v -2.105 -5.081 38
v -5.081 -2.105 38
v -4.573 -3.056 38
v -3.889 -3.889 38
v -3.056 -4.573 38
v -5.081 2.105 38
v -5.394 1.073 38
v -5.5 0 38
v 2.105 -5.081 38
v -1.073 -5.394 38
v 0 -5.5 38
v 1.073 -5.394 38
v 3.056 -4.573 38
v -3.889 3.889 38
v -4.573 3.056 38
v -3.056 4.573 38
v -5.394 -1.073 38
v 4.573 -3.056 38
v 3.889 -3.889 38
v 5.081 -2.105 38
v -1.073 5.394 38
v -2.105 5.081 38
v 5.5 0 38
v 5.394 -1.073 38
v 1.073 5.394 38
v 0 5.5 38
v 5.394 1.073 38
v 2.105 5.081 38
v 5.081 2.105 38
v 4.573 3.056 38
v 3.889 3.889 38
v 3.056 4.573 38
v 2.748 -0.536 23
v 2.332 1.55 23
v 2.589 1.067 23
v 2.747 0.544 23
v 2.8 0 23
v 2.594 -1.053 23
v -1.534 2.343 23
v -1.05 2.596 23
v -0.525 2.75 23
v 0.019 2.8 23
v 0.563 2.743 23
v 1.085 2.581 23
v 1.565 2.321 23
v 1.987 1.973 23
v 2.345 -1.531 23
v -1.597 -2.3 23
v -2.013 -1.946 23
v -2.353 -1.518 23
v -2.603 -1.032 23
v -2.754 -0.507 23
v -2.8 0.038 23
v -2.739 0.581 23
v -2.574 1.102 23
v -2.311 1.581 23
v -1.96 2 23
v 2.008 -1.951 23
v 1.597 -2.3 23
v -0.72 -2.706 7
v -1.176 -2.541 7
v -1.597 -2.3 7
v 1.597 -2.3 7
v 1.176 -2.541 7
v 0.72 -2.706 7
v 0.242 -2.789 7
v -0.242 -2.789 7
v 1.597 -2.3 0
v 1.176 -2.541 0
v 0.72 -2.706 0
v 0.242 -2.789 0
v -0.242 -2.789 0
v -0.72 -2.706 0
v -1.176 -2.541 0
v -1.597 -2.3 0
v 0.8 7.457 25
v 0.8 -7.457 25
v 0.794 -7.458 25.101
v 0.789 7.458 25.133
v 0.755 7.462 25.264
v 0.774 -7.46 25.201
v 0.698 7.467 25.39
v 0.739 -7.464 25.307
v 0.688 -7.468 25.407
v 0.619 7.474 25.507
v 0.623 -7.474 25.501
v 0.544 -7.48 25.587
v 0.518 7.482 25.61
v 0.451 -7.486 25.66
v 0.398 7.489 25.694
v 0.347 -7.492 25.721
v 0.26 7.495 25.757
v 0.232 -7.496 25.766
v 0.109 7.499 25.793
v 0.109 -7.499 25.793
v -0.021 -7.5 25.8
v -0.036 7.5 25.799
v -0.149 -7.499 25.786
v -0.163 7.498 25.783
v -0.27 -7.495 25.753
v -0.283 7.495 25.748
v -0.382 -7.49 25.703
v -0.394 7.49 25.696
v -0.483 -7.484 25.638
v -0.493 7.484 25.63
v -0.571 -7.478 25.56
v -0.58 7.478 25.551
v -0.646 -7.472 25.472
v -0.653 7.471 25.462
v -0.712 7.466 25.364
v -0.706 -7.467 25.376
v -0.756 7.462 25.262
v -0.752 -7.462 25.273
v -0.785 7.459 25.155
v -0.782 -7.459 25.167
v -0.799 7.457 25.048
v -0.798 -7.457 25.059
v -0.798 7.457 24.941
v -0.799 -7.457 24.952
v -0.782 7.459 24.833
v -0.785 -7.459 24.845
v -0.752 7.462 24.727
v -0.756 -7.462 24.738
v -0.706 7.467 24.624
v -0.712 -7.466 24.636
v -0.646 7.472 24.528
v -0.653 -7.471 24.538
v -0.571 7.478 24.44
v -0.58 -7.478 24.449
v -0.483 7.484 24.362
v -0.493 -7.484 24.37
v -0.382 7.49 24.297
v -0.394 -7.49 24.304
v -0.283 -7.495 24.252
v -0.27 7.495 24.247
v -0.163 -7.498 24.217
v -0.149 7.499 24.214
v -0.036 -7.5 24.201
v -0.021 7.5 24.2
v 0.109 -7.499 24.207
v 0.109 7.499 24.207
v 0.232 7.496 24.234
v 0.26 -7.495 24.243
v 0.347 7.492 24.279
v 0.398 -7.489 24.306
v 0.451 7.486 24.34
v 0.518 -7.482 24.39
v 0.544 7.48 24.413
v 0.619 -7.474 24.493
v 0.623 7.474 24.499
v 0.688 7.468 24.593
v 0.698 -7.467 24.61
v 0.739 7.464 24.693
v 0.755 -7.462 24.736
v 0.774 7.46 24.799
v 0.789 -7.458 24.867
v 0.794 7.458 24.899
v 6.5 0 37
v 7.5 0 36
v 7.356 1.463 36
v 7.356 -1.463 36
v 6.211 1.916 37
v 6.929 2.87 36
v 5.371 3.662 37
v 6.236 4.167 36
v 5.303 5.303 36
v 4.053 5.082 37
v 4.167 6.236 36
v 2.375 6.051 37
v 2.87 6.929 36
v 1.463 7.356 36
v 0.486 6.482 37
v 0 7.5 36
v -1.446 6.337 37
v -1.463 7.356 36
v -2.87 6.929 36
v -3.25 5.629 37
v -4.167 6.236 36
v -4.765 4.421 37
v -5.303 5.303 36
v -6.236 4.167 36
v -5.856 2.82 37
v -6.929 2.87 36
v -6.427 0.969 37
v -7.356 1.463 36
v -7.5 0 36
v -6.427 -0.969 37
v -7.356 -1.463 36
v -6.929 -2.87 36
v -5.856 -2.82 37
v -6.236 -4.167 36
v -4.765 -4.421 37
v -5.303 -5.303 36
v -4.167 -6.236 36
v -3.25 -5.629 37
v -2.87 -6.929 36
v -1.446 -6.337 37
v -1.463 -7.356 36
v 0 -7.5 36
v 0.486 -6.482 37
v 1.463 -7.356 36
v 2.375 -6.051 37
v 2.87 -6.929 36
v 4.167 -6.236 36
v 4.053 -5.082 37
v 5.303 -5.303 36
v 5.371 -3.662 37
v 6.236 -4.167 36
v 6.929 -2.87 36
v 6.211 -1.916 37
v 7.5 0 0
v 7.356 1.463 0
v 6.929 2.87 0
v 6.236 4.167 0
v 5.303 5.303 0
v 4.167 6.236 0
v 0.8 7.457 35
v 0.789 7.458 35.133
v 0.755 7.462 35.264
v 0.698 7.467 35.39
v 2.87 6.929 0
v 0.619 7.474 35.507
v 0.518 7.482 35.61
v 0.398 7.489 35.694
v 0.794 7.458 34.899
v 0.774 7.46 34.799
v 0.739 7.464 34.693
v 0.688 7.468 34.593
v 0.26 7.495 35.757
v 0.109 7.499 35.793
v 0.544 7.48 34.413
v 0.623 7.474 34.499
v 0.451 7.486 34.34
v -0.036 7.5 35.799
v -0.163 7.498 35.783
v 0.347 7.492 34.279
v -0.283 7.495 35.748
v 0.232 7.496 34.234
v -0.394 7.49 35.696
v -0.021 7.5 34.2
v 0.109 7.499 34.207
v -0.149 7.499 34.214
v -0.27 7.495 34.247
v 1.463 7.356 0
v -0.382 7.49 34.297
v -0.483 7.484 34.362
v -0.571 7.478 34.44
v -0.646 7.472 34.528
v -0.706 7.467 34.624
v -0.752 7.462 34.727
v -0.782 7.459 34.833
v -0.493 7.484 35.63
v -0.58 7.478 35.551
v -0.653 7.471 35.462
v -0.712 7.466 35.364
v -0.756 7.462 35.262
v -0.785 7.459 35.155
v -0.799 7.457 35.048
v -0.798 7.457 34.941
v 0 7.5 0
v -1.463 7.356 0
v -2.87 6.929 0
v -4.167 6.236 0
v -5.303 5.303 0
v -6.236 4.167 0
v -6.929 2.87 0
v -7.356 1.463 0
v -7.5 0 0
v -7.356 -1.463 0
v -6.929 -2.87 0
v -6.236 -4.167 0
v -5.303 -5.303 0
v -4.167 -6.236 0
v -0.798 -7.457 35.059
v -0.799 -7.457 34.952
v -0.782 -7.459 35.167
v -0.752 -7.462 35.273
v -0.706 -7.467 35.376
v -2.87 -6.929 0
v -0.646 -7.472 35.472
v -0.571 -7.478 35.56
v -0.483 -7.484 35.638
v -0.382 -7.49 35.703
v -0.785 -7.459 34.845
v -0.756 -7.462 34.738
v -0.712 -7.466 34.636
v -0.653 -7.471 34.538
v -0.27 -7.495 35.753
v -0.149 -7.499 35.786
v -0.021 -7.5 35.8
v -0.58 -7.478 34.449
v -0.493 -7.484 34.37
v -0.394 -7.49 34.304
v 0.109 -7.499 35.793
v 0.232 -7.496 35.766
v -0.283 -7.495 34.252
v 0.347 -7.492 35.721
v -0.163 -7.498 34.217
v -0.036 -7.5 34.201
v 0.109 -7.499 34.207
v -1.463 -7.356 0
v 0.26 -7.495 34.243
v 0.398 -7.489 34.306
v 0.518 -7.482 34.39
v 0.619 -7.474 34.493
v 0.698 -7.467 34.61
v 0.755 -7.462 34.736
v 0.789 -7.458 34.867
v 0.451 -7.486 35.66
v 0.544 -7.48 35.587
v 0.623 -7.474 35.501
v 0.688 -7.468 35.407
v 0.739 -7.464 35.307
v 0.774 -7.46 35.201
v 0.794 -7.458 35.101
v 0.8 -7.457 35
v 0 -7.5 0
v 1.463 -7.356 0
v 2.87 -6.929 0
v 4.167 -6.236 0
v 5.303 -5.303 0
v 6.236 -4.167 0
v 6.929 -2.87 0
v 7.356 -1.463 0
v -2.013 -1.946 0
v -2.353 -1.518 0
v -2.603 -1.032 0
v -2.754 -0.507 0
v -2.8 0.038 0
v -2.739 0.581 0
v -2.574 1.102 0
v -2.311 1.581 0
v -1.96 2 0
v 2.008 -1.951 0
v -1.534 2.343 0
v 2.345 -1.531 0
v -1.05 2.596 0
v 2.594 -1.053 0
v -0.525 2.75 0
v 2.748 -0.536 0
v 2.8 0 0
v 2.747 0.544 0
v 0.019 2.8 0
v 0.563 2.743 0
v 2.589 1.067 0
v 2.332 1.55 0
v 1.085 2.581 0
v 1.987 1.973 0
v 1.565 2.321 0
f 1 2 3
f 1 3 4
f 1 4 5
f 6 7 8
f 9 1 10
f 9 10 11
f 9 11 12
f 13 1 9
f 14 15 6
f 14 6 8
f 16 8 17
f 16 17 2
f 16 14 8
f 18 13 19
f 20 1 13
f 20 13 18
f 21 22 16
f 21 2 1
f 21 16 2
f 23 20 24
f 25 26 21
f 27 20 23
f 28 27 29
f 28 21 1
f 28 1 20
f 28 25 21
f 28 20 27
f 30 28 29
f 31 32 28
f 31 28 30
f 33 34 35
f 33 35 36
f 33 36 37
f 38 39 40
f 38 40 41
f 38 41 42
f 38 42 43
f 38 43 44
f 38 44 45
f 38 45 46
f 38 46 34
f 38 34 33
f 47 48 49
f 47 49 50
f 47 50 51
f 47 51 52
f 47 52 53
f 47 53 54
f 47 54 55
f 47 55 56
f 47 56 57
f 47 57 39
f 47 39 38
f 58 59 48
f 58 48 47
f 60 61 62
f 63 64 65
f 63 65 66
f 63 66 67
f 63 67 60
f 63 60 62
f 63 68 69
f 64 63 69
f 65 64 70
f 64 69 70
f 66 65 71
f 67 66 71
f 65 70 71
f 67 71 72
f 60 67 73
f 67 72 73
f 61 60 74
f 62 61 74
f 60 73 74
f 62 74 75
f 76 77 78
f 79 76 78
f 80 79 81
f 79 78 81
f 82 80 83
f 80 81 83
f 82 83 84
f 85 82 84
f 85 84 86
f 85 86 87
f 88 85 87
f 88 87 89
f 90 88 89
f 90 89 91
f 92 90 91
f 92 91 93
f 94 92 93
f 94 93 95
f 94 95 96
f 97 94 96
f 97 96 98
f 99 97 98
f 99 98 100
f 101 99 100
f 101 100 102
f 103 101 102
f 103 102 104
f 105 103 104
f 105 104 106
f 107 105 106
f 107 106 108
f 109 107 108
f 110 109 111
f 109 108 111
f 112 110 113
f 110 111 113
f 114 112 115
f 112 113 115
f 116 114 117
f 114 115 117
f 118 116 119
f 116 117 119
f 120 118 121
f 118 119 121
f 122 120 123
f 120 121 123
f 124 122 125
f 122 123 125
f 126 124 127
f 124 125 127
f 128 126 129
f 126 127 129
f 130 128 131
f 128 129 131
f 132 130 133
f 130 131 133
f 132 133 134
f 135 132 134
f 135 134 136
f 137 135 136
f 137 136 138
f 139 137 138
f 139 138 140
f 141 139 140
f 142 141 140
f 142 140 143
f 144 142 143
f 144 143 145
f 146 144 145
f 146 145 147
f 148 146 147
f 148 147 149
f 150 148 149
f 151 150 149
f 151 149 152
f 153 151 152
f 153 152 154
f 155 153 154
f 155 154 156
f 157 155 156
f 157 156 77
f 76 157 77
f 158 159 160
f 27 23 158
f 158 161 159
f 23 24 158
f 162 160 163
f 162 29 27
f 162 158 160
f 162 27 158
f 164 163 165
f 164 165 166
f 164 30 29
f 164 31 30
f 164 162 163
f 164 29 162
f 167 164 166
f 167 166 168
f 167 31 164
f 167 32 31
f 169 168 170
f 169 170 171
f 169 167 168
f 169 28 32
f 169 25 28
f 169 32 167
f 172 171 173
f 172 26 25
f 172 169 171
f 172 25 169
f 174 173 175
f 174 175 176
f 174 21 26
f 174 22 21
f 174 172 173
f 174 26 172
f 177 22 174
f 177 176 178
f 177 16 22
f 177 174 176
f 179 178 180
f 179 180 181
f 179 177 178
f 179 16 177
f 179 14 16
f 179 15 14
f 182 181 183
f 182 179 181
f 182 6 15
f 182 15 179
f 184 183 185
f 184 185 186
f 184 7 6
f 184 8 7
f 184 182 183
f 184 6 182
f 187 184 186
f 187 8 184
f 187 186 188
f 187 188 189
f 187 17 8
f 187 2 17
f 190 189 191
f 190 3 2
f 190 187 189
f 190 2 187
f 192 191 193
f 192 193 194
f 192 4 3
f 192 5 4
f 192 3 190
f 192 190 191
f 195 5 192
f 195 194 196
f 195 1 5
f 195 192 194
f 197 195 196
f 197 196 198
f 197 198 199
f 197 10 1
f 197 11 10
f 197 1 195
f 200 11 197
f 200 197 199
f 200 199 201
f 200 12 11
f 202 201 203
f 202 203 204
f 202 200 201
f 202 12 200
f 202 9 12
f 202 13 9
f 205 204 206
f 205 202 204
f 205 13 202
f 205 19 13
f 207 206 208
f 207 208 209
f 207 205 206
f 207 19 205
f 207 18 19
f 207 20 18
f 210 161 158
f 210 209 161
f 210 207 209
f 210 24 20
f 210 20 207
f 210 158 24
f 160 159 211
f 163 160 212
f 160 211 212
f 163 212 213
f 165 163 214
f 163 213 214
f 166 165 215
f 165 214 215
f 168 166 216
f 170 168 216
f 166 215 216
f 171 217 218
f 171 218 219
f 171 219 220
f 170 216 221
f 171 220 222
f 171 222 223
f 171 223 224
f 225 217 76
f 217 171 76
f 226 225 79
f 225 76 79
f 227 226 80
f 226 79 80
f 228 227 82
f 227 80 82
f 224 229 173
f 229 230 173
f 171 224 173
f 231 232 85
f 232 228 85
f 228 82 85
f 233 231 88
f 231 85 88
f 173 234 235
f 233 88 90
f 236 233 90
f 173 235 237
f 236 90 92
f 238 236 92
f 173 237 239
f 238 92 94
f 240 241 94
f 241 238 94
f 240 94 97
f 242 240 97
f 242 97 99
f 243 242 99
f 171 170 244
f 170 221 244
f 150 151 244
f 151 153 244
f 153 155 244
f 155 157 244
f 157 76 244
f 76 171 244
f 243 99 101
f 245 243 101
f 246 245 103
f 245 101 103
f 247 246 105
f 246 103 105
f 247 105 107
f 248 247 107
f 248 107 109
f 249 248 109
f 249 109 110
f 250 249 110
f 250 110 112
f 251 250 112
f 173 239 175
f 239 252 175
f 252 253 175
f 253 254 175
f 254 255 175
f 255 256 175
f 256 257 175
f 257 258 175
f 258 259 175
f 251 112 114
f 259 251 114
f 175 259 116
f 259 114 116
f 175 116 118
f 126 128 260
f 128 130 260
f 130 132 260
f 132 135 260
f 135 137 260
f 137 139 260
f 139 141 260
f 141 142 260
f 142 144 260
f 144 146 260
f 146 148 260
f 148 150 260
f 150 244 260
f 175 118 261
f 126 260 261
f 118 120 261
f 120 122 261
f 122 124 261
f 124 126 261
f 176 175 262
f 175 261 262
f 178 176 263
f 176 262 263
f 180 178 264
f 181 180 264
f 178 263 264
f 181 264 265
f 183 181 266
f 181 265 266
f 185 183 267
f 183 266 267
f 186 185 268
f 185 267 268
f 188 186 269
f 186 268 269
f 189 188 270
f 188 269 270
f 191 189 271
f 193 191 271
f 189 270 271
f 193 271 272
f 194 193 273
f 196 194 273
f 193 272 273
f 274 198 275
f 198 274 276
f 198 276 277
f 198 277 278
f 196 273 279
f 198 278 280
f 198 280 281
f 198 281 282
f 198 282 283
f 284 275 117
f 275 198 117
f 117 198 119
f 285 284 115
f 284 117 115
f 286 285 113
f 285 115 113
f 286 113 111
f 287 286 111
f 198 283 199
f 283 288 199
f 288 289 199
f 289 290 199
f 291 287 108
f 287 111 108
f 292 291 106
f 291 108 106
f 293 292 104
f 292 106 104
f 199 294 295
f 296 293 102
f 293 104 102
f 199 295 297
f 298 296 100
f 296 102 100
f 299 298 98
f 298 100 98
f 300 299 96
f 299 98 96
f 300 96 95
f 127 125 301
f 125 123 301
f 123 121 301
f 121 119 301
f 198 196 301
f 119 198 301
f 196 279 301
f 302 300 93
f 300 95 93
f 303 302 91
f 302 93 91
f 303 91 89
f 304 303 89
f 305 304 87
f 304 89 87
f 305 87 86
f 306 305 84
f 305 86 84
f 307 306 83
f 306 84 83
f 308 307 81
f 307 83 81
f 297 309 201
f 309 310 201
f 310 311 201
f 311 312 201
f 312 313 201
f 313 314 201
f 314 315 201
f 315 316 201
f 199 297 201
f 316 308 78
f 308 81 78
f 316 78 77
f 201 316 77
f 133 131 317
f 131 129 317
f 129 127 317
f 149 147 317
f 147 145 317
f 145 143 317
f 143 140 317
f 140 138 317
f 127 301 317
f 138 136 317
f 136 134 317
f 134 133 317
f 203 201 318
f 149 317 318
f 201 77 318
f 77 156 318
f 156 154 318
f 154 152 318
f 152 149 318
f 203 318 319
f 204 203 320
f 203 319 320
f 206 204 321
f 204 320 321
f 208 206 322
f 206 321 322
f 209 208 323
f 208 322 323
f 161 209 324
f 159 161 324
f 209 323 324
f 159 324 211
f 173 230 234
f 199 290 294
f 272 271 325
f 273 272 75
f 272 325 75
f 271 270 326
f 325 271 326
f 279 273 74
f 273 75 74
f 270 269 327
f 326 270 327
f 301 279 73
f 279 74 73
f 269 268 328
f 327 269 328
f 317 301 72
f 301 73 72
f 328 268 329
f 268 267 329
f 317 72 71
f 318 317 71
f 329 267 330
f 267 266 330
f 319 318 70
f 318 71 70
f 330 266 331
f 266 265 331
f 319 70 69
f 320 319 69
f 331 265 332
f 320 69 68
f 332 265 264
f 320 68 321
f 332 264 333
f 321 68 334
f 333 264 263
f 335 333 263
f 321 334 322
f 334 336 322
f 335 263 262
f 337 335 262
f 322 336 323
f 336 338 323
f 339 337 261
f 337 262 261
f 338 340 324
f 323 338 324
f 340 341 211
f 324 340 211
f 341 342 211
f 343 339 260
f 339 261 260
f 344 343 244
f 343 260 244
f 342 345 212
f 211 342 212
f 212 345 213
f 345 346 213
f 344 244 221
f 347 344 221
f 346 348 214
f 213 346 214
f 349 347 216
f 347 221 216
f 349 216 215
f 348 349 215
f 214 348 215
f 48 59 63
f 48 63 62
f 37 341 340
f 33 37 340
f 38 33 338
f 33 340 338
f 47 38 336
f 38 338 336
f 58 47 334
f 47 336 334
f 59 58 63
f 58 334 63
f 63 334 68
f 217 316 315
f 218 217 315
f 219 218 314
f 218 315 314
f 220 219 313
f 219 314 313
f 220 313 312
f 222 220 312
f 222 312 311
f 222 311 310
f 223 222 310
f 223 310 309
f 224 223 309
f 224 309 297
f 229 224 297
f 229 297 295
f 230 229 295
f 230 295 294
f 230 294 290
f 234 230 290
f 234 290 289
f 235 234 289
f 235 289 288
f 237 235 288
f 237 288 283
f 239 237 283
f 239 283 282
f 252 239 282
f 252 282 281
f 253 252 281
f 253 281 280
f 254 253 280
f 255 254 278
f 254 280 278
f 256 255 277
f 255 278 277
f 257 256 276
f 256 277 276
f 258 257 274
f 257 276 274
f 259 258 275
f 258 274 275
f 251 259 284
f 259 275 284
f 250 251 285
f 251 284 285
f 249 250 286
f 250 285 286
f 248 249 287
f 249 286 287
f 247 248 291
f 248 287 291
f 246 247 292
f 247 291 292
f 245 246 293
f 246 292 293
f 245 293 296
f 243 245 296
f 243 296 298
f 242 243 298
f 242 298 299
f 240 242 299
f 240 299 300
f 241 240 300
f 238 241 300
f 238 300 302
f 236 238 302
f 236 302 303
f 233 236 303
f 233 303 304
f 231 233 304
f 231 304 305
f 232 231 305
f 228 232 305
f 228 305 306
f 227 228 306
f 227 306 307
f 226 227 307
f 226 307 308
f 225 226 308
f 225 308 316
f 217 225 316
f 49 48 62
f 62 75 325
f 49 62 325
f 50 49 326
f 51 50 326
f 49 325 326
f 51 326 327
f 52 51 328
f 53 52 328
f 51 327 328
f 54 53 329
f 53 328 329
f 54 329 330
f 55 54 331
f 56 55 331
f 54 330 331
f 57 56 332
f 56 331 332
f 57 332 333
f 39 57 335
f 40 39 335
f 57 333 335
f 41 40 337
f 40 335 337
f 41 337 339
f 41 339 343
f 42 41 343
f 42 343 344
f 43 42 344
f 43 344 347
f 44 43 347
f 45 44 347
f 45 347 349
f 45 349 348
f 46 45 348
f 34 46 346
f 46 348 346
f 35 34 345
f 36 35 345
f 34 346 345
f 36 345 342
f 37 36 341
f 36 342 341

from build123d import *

# Parameters (mm, degrees)
F0_R     = 7.5
F1_DEPTH = 38
F3_R     = 0.8
F4_DEPTH = 15.001
F5_SIZE  = 2
F7_DEPTH = 23
F8_DEPTH = 7


with BuildPart() as f1:
    # F0 (on Top) → F1 (new body)
    with BuildSketch(Plane.XY):
        Circle(F0_R)
    extrude(amount=F1_DEPTH)

    # F3 (on offset) → F4 (cut, through all)
    with BuildSketch(Plane.XZ.offset(7.5)):
        with Locations((0, 35)):
            Circle(F3_R)
        with Locations((0, 25)):
            Circle(F3_R)
    extrude(amount=-F4_DEPTH, mode=Mode.SUBTRACT)

    # F5
    f5_edges = [f1.edges().sort_by_distance(p)[0] for p in [
        (-7.5, 0, 38),
    ]]
    chamfer(f5_edges, length=F5_SIZE)

    # F6 (on face) → F7 (cut)
    with BuildSketch(Plane(origin=(0, 0, 0), x_dir=(1, 0, 0), z_dir=(0, 0, -1))):
        with BuildLine():
            ThreePointArc((-1.596872, 2.3), (-1.297836, -2.481052), (2.8, 0))
            ThreePointArc((2.8, 0), (2.481052, 1.297836), (1.596872, 2.3))
            Line((1.596872, 2.3), (-1.596872, 2.3))
        make_face()
    extrude(amount=-F7_DEPTH, mode=Mode.SUBTRACT)

    # F6 (on face) → F8 (cut)
    with BuildSketch(Plane(origin=(0, 0, 0), x_dir=(1, 0, 0), z_dir=(0, 0, -1))):
        with BuildLine():
            Line((-1.596872, 2.3), (1.596872, 2.3))
            ThreePointArc((1.596872, 2.3), (0, 2.8), (-1.596872, 2.3))
        make_face()
    extrude(amount=-F8_DEPTH, mode=Mode.SUBTRACT)


solid = f1.part
